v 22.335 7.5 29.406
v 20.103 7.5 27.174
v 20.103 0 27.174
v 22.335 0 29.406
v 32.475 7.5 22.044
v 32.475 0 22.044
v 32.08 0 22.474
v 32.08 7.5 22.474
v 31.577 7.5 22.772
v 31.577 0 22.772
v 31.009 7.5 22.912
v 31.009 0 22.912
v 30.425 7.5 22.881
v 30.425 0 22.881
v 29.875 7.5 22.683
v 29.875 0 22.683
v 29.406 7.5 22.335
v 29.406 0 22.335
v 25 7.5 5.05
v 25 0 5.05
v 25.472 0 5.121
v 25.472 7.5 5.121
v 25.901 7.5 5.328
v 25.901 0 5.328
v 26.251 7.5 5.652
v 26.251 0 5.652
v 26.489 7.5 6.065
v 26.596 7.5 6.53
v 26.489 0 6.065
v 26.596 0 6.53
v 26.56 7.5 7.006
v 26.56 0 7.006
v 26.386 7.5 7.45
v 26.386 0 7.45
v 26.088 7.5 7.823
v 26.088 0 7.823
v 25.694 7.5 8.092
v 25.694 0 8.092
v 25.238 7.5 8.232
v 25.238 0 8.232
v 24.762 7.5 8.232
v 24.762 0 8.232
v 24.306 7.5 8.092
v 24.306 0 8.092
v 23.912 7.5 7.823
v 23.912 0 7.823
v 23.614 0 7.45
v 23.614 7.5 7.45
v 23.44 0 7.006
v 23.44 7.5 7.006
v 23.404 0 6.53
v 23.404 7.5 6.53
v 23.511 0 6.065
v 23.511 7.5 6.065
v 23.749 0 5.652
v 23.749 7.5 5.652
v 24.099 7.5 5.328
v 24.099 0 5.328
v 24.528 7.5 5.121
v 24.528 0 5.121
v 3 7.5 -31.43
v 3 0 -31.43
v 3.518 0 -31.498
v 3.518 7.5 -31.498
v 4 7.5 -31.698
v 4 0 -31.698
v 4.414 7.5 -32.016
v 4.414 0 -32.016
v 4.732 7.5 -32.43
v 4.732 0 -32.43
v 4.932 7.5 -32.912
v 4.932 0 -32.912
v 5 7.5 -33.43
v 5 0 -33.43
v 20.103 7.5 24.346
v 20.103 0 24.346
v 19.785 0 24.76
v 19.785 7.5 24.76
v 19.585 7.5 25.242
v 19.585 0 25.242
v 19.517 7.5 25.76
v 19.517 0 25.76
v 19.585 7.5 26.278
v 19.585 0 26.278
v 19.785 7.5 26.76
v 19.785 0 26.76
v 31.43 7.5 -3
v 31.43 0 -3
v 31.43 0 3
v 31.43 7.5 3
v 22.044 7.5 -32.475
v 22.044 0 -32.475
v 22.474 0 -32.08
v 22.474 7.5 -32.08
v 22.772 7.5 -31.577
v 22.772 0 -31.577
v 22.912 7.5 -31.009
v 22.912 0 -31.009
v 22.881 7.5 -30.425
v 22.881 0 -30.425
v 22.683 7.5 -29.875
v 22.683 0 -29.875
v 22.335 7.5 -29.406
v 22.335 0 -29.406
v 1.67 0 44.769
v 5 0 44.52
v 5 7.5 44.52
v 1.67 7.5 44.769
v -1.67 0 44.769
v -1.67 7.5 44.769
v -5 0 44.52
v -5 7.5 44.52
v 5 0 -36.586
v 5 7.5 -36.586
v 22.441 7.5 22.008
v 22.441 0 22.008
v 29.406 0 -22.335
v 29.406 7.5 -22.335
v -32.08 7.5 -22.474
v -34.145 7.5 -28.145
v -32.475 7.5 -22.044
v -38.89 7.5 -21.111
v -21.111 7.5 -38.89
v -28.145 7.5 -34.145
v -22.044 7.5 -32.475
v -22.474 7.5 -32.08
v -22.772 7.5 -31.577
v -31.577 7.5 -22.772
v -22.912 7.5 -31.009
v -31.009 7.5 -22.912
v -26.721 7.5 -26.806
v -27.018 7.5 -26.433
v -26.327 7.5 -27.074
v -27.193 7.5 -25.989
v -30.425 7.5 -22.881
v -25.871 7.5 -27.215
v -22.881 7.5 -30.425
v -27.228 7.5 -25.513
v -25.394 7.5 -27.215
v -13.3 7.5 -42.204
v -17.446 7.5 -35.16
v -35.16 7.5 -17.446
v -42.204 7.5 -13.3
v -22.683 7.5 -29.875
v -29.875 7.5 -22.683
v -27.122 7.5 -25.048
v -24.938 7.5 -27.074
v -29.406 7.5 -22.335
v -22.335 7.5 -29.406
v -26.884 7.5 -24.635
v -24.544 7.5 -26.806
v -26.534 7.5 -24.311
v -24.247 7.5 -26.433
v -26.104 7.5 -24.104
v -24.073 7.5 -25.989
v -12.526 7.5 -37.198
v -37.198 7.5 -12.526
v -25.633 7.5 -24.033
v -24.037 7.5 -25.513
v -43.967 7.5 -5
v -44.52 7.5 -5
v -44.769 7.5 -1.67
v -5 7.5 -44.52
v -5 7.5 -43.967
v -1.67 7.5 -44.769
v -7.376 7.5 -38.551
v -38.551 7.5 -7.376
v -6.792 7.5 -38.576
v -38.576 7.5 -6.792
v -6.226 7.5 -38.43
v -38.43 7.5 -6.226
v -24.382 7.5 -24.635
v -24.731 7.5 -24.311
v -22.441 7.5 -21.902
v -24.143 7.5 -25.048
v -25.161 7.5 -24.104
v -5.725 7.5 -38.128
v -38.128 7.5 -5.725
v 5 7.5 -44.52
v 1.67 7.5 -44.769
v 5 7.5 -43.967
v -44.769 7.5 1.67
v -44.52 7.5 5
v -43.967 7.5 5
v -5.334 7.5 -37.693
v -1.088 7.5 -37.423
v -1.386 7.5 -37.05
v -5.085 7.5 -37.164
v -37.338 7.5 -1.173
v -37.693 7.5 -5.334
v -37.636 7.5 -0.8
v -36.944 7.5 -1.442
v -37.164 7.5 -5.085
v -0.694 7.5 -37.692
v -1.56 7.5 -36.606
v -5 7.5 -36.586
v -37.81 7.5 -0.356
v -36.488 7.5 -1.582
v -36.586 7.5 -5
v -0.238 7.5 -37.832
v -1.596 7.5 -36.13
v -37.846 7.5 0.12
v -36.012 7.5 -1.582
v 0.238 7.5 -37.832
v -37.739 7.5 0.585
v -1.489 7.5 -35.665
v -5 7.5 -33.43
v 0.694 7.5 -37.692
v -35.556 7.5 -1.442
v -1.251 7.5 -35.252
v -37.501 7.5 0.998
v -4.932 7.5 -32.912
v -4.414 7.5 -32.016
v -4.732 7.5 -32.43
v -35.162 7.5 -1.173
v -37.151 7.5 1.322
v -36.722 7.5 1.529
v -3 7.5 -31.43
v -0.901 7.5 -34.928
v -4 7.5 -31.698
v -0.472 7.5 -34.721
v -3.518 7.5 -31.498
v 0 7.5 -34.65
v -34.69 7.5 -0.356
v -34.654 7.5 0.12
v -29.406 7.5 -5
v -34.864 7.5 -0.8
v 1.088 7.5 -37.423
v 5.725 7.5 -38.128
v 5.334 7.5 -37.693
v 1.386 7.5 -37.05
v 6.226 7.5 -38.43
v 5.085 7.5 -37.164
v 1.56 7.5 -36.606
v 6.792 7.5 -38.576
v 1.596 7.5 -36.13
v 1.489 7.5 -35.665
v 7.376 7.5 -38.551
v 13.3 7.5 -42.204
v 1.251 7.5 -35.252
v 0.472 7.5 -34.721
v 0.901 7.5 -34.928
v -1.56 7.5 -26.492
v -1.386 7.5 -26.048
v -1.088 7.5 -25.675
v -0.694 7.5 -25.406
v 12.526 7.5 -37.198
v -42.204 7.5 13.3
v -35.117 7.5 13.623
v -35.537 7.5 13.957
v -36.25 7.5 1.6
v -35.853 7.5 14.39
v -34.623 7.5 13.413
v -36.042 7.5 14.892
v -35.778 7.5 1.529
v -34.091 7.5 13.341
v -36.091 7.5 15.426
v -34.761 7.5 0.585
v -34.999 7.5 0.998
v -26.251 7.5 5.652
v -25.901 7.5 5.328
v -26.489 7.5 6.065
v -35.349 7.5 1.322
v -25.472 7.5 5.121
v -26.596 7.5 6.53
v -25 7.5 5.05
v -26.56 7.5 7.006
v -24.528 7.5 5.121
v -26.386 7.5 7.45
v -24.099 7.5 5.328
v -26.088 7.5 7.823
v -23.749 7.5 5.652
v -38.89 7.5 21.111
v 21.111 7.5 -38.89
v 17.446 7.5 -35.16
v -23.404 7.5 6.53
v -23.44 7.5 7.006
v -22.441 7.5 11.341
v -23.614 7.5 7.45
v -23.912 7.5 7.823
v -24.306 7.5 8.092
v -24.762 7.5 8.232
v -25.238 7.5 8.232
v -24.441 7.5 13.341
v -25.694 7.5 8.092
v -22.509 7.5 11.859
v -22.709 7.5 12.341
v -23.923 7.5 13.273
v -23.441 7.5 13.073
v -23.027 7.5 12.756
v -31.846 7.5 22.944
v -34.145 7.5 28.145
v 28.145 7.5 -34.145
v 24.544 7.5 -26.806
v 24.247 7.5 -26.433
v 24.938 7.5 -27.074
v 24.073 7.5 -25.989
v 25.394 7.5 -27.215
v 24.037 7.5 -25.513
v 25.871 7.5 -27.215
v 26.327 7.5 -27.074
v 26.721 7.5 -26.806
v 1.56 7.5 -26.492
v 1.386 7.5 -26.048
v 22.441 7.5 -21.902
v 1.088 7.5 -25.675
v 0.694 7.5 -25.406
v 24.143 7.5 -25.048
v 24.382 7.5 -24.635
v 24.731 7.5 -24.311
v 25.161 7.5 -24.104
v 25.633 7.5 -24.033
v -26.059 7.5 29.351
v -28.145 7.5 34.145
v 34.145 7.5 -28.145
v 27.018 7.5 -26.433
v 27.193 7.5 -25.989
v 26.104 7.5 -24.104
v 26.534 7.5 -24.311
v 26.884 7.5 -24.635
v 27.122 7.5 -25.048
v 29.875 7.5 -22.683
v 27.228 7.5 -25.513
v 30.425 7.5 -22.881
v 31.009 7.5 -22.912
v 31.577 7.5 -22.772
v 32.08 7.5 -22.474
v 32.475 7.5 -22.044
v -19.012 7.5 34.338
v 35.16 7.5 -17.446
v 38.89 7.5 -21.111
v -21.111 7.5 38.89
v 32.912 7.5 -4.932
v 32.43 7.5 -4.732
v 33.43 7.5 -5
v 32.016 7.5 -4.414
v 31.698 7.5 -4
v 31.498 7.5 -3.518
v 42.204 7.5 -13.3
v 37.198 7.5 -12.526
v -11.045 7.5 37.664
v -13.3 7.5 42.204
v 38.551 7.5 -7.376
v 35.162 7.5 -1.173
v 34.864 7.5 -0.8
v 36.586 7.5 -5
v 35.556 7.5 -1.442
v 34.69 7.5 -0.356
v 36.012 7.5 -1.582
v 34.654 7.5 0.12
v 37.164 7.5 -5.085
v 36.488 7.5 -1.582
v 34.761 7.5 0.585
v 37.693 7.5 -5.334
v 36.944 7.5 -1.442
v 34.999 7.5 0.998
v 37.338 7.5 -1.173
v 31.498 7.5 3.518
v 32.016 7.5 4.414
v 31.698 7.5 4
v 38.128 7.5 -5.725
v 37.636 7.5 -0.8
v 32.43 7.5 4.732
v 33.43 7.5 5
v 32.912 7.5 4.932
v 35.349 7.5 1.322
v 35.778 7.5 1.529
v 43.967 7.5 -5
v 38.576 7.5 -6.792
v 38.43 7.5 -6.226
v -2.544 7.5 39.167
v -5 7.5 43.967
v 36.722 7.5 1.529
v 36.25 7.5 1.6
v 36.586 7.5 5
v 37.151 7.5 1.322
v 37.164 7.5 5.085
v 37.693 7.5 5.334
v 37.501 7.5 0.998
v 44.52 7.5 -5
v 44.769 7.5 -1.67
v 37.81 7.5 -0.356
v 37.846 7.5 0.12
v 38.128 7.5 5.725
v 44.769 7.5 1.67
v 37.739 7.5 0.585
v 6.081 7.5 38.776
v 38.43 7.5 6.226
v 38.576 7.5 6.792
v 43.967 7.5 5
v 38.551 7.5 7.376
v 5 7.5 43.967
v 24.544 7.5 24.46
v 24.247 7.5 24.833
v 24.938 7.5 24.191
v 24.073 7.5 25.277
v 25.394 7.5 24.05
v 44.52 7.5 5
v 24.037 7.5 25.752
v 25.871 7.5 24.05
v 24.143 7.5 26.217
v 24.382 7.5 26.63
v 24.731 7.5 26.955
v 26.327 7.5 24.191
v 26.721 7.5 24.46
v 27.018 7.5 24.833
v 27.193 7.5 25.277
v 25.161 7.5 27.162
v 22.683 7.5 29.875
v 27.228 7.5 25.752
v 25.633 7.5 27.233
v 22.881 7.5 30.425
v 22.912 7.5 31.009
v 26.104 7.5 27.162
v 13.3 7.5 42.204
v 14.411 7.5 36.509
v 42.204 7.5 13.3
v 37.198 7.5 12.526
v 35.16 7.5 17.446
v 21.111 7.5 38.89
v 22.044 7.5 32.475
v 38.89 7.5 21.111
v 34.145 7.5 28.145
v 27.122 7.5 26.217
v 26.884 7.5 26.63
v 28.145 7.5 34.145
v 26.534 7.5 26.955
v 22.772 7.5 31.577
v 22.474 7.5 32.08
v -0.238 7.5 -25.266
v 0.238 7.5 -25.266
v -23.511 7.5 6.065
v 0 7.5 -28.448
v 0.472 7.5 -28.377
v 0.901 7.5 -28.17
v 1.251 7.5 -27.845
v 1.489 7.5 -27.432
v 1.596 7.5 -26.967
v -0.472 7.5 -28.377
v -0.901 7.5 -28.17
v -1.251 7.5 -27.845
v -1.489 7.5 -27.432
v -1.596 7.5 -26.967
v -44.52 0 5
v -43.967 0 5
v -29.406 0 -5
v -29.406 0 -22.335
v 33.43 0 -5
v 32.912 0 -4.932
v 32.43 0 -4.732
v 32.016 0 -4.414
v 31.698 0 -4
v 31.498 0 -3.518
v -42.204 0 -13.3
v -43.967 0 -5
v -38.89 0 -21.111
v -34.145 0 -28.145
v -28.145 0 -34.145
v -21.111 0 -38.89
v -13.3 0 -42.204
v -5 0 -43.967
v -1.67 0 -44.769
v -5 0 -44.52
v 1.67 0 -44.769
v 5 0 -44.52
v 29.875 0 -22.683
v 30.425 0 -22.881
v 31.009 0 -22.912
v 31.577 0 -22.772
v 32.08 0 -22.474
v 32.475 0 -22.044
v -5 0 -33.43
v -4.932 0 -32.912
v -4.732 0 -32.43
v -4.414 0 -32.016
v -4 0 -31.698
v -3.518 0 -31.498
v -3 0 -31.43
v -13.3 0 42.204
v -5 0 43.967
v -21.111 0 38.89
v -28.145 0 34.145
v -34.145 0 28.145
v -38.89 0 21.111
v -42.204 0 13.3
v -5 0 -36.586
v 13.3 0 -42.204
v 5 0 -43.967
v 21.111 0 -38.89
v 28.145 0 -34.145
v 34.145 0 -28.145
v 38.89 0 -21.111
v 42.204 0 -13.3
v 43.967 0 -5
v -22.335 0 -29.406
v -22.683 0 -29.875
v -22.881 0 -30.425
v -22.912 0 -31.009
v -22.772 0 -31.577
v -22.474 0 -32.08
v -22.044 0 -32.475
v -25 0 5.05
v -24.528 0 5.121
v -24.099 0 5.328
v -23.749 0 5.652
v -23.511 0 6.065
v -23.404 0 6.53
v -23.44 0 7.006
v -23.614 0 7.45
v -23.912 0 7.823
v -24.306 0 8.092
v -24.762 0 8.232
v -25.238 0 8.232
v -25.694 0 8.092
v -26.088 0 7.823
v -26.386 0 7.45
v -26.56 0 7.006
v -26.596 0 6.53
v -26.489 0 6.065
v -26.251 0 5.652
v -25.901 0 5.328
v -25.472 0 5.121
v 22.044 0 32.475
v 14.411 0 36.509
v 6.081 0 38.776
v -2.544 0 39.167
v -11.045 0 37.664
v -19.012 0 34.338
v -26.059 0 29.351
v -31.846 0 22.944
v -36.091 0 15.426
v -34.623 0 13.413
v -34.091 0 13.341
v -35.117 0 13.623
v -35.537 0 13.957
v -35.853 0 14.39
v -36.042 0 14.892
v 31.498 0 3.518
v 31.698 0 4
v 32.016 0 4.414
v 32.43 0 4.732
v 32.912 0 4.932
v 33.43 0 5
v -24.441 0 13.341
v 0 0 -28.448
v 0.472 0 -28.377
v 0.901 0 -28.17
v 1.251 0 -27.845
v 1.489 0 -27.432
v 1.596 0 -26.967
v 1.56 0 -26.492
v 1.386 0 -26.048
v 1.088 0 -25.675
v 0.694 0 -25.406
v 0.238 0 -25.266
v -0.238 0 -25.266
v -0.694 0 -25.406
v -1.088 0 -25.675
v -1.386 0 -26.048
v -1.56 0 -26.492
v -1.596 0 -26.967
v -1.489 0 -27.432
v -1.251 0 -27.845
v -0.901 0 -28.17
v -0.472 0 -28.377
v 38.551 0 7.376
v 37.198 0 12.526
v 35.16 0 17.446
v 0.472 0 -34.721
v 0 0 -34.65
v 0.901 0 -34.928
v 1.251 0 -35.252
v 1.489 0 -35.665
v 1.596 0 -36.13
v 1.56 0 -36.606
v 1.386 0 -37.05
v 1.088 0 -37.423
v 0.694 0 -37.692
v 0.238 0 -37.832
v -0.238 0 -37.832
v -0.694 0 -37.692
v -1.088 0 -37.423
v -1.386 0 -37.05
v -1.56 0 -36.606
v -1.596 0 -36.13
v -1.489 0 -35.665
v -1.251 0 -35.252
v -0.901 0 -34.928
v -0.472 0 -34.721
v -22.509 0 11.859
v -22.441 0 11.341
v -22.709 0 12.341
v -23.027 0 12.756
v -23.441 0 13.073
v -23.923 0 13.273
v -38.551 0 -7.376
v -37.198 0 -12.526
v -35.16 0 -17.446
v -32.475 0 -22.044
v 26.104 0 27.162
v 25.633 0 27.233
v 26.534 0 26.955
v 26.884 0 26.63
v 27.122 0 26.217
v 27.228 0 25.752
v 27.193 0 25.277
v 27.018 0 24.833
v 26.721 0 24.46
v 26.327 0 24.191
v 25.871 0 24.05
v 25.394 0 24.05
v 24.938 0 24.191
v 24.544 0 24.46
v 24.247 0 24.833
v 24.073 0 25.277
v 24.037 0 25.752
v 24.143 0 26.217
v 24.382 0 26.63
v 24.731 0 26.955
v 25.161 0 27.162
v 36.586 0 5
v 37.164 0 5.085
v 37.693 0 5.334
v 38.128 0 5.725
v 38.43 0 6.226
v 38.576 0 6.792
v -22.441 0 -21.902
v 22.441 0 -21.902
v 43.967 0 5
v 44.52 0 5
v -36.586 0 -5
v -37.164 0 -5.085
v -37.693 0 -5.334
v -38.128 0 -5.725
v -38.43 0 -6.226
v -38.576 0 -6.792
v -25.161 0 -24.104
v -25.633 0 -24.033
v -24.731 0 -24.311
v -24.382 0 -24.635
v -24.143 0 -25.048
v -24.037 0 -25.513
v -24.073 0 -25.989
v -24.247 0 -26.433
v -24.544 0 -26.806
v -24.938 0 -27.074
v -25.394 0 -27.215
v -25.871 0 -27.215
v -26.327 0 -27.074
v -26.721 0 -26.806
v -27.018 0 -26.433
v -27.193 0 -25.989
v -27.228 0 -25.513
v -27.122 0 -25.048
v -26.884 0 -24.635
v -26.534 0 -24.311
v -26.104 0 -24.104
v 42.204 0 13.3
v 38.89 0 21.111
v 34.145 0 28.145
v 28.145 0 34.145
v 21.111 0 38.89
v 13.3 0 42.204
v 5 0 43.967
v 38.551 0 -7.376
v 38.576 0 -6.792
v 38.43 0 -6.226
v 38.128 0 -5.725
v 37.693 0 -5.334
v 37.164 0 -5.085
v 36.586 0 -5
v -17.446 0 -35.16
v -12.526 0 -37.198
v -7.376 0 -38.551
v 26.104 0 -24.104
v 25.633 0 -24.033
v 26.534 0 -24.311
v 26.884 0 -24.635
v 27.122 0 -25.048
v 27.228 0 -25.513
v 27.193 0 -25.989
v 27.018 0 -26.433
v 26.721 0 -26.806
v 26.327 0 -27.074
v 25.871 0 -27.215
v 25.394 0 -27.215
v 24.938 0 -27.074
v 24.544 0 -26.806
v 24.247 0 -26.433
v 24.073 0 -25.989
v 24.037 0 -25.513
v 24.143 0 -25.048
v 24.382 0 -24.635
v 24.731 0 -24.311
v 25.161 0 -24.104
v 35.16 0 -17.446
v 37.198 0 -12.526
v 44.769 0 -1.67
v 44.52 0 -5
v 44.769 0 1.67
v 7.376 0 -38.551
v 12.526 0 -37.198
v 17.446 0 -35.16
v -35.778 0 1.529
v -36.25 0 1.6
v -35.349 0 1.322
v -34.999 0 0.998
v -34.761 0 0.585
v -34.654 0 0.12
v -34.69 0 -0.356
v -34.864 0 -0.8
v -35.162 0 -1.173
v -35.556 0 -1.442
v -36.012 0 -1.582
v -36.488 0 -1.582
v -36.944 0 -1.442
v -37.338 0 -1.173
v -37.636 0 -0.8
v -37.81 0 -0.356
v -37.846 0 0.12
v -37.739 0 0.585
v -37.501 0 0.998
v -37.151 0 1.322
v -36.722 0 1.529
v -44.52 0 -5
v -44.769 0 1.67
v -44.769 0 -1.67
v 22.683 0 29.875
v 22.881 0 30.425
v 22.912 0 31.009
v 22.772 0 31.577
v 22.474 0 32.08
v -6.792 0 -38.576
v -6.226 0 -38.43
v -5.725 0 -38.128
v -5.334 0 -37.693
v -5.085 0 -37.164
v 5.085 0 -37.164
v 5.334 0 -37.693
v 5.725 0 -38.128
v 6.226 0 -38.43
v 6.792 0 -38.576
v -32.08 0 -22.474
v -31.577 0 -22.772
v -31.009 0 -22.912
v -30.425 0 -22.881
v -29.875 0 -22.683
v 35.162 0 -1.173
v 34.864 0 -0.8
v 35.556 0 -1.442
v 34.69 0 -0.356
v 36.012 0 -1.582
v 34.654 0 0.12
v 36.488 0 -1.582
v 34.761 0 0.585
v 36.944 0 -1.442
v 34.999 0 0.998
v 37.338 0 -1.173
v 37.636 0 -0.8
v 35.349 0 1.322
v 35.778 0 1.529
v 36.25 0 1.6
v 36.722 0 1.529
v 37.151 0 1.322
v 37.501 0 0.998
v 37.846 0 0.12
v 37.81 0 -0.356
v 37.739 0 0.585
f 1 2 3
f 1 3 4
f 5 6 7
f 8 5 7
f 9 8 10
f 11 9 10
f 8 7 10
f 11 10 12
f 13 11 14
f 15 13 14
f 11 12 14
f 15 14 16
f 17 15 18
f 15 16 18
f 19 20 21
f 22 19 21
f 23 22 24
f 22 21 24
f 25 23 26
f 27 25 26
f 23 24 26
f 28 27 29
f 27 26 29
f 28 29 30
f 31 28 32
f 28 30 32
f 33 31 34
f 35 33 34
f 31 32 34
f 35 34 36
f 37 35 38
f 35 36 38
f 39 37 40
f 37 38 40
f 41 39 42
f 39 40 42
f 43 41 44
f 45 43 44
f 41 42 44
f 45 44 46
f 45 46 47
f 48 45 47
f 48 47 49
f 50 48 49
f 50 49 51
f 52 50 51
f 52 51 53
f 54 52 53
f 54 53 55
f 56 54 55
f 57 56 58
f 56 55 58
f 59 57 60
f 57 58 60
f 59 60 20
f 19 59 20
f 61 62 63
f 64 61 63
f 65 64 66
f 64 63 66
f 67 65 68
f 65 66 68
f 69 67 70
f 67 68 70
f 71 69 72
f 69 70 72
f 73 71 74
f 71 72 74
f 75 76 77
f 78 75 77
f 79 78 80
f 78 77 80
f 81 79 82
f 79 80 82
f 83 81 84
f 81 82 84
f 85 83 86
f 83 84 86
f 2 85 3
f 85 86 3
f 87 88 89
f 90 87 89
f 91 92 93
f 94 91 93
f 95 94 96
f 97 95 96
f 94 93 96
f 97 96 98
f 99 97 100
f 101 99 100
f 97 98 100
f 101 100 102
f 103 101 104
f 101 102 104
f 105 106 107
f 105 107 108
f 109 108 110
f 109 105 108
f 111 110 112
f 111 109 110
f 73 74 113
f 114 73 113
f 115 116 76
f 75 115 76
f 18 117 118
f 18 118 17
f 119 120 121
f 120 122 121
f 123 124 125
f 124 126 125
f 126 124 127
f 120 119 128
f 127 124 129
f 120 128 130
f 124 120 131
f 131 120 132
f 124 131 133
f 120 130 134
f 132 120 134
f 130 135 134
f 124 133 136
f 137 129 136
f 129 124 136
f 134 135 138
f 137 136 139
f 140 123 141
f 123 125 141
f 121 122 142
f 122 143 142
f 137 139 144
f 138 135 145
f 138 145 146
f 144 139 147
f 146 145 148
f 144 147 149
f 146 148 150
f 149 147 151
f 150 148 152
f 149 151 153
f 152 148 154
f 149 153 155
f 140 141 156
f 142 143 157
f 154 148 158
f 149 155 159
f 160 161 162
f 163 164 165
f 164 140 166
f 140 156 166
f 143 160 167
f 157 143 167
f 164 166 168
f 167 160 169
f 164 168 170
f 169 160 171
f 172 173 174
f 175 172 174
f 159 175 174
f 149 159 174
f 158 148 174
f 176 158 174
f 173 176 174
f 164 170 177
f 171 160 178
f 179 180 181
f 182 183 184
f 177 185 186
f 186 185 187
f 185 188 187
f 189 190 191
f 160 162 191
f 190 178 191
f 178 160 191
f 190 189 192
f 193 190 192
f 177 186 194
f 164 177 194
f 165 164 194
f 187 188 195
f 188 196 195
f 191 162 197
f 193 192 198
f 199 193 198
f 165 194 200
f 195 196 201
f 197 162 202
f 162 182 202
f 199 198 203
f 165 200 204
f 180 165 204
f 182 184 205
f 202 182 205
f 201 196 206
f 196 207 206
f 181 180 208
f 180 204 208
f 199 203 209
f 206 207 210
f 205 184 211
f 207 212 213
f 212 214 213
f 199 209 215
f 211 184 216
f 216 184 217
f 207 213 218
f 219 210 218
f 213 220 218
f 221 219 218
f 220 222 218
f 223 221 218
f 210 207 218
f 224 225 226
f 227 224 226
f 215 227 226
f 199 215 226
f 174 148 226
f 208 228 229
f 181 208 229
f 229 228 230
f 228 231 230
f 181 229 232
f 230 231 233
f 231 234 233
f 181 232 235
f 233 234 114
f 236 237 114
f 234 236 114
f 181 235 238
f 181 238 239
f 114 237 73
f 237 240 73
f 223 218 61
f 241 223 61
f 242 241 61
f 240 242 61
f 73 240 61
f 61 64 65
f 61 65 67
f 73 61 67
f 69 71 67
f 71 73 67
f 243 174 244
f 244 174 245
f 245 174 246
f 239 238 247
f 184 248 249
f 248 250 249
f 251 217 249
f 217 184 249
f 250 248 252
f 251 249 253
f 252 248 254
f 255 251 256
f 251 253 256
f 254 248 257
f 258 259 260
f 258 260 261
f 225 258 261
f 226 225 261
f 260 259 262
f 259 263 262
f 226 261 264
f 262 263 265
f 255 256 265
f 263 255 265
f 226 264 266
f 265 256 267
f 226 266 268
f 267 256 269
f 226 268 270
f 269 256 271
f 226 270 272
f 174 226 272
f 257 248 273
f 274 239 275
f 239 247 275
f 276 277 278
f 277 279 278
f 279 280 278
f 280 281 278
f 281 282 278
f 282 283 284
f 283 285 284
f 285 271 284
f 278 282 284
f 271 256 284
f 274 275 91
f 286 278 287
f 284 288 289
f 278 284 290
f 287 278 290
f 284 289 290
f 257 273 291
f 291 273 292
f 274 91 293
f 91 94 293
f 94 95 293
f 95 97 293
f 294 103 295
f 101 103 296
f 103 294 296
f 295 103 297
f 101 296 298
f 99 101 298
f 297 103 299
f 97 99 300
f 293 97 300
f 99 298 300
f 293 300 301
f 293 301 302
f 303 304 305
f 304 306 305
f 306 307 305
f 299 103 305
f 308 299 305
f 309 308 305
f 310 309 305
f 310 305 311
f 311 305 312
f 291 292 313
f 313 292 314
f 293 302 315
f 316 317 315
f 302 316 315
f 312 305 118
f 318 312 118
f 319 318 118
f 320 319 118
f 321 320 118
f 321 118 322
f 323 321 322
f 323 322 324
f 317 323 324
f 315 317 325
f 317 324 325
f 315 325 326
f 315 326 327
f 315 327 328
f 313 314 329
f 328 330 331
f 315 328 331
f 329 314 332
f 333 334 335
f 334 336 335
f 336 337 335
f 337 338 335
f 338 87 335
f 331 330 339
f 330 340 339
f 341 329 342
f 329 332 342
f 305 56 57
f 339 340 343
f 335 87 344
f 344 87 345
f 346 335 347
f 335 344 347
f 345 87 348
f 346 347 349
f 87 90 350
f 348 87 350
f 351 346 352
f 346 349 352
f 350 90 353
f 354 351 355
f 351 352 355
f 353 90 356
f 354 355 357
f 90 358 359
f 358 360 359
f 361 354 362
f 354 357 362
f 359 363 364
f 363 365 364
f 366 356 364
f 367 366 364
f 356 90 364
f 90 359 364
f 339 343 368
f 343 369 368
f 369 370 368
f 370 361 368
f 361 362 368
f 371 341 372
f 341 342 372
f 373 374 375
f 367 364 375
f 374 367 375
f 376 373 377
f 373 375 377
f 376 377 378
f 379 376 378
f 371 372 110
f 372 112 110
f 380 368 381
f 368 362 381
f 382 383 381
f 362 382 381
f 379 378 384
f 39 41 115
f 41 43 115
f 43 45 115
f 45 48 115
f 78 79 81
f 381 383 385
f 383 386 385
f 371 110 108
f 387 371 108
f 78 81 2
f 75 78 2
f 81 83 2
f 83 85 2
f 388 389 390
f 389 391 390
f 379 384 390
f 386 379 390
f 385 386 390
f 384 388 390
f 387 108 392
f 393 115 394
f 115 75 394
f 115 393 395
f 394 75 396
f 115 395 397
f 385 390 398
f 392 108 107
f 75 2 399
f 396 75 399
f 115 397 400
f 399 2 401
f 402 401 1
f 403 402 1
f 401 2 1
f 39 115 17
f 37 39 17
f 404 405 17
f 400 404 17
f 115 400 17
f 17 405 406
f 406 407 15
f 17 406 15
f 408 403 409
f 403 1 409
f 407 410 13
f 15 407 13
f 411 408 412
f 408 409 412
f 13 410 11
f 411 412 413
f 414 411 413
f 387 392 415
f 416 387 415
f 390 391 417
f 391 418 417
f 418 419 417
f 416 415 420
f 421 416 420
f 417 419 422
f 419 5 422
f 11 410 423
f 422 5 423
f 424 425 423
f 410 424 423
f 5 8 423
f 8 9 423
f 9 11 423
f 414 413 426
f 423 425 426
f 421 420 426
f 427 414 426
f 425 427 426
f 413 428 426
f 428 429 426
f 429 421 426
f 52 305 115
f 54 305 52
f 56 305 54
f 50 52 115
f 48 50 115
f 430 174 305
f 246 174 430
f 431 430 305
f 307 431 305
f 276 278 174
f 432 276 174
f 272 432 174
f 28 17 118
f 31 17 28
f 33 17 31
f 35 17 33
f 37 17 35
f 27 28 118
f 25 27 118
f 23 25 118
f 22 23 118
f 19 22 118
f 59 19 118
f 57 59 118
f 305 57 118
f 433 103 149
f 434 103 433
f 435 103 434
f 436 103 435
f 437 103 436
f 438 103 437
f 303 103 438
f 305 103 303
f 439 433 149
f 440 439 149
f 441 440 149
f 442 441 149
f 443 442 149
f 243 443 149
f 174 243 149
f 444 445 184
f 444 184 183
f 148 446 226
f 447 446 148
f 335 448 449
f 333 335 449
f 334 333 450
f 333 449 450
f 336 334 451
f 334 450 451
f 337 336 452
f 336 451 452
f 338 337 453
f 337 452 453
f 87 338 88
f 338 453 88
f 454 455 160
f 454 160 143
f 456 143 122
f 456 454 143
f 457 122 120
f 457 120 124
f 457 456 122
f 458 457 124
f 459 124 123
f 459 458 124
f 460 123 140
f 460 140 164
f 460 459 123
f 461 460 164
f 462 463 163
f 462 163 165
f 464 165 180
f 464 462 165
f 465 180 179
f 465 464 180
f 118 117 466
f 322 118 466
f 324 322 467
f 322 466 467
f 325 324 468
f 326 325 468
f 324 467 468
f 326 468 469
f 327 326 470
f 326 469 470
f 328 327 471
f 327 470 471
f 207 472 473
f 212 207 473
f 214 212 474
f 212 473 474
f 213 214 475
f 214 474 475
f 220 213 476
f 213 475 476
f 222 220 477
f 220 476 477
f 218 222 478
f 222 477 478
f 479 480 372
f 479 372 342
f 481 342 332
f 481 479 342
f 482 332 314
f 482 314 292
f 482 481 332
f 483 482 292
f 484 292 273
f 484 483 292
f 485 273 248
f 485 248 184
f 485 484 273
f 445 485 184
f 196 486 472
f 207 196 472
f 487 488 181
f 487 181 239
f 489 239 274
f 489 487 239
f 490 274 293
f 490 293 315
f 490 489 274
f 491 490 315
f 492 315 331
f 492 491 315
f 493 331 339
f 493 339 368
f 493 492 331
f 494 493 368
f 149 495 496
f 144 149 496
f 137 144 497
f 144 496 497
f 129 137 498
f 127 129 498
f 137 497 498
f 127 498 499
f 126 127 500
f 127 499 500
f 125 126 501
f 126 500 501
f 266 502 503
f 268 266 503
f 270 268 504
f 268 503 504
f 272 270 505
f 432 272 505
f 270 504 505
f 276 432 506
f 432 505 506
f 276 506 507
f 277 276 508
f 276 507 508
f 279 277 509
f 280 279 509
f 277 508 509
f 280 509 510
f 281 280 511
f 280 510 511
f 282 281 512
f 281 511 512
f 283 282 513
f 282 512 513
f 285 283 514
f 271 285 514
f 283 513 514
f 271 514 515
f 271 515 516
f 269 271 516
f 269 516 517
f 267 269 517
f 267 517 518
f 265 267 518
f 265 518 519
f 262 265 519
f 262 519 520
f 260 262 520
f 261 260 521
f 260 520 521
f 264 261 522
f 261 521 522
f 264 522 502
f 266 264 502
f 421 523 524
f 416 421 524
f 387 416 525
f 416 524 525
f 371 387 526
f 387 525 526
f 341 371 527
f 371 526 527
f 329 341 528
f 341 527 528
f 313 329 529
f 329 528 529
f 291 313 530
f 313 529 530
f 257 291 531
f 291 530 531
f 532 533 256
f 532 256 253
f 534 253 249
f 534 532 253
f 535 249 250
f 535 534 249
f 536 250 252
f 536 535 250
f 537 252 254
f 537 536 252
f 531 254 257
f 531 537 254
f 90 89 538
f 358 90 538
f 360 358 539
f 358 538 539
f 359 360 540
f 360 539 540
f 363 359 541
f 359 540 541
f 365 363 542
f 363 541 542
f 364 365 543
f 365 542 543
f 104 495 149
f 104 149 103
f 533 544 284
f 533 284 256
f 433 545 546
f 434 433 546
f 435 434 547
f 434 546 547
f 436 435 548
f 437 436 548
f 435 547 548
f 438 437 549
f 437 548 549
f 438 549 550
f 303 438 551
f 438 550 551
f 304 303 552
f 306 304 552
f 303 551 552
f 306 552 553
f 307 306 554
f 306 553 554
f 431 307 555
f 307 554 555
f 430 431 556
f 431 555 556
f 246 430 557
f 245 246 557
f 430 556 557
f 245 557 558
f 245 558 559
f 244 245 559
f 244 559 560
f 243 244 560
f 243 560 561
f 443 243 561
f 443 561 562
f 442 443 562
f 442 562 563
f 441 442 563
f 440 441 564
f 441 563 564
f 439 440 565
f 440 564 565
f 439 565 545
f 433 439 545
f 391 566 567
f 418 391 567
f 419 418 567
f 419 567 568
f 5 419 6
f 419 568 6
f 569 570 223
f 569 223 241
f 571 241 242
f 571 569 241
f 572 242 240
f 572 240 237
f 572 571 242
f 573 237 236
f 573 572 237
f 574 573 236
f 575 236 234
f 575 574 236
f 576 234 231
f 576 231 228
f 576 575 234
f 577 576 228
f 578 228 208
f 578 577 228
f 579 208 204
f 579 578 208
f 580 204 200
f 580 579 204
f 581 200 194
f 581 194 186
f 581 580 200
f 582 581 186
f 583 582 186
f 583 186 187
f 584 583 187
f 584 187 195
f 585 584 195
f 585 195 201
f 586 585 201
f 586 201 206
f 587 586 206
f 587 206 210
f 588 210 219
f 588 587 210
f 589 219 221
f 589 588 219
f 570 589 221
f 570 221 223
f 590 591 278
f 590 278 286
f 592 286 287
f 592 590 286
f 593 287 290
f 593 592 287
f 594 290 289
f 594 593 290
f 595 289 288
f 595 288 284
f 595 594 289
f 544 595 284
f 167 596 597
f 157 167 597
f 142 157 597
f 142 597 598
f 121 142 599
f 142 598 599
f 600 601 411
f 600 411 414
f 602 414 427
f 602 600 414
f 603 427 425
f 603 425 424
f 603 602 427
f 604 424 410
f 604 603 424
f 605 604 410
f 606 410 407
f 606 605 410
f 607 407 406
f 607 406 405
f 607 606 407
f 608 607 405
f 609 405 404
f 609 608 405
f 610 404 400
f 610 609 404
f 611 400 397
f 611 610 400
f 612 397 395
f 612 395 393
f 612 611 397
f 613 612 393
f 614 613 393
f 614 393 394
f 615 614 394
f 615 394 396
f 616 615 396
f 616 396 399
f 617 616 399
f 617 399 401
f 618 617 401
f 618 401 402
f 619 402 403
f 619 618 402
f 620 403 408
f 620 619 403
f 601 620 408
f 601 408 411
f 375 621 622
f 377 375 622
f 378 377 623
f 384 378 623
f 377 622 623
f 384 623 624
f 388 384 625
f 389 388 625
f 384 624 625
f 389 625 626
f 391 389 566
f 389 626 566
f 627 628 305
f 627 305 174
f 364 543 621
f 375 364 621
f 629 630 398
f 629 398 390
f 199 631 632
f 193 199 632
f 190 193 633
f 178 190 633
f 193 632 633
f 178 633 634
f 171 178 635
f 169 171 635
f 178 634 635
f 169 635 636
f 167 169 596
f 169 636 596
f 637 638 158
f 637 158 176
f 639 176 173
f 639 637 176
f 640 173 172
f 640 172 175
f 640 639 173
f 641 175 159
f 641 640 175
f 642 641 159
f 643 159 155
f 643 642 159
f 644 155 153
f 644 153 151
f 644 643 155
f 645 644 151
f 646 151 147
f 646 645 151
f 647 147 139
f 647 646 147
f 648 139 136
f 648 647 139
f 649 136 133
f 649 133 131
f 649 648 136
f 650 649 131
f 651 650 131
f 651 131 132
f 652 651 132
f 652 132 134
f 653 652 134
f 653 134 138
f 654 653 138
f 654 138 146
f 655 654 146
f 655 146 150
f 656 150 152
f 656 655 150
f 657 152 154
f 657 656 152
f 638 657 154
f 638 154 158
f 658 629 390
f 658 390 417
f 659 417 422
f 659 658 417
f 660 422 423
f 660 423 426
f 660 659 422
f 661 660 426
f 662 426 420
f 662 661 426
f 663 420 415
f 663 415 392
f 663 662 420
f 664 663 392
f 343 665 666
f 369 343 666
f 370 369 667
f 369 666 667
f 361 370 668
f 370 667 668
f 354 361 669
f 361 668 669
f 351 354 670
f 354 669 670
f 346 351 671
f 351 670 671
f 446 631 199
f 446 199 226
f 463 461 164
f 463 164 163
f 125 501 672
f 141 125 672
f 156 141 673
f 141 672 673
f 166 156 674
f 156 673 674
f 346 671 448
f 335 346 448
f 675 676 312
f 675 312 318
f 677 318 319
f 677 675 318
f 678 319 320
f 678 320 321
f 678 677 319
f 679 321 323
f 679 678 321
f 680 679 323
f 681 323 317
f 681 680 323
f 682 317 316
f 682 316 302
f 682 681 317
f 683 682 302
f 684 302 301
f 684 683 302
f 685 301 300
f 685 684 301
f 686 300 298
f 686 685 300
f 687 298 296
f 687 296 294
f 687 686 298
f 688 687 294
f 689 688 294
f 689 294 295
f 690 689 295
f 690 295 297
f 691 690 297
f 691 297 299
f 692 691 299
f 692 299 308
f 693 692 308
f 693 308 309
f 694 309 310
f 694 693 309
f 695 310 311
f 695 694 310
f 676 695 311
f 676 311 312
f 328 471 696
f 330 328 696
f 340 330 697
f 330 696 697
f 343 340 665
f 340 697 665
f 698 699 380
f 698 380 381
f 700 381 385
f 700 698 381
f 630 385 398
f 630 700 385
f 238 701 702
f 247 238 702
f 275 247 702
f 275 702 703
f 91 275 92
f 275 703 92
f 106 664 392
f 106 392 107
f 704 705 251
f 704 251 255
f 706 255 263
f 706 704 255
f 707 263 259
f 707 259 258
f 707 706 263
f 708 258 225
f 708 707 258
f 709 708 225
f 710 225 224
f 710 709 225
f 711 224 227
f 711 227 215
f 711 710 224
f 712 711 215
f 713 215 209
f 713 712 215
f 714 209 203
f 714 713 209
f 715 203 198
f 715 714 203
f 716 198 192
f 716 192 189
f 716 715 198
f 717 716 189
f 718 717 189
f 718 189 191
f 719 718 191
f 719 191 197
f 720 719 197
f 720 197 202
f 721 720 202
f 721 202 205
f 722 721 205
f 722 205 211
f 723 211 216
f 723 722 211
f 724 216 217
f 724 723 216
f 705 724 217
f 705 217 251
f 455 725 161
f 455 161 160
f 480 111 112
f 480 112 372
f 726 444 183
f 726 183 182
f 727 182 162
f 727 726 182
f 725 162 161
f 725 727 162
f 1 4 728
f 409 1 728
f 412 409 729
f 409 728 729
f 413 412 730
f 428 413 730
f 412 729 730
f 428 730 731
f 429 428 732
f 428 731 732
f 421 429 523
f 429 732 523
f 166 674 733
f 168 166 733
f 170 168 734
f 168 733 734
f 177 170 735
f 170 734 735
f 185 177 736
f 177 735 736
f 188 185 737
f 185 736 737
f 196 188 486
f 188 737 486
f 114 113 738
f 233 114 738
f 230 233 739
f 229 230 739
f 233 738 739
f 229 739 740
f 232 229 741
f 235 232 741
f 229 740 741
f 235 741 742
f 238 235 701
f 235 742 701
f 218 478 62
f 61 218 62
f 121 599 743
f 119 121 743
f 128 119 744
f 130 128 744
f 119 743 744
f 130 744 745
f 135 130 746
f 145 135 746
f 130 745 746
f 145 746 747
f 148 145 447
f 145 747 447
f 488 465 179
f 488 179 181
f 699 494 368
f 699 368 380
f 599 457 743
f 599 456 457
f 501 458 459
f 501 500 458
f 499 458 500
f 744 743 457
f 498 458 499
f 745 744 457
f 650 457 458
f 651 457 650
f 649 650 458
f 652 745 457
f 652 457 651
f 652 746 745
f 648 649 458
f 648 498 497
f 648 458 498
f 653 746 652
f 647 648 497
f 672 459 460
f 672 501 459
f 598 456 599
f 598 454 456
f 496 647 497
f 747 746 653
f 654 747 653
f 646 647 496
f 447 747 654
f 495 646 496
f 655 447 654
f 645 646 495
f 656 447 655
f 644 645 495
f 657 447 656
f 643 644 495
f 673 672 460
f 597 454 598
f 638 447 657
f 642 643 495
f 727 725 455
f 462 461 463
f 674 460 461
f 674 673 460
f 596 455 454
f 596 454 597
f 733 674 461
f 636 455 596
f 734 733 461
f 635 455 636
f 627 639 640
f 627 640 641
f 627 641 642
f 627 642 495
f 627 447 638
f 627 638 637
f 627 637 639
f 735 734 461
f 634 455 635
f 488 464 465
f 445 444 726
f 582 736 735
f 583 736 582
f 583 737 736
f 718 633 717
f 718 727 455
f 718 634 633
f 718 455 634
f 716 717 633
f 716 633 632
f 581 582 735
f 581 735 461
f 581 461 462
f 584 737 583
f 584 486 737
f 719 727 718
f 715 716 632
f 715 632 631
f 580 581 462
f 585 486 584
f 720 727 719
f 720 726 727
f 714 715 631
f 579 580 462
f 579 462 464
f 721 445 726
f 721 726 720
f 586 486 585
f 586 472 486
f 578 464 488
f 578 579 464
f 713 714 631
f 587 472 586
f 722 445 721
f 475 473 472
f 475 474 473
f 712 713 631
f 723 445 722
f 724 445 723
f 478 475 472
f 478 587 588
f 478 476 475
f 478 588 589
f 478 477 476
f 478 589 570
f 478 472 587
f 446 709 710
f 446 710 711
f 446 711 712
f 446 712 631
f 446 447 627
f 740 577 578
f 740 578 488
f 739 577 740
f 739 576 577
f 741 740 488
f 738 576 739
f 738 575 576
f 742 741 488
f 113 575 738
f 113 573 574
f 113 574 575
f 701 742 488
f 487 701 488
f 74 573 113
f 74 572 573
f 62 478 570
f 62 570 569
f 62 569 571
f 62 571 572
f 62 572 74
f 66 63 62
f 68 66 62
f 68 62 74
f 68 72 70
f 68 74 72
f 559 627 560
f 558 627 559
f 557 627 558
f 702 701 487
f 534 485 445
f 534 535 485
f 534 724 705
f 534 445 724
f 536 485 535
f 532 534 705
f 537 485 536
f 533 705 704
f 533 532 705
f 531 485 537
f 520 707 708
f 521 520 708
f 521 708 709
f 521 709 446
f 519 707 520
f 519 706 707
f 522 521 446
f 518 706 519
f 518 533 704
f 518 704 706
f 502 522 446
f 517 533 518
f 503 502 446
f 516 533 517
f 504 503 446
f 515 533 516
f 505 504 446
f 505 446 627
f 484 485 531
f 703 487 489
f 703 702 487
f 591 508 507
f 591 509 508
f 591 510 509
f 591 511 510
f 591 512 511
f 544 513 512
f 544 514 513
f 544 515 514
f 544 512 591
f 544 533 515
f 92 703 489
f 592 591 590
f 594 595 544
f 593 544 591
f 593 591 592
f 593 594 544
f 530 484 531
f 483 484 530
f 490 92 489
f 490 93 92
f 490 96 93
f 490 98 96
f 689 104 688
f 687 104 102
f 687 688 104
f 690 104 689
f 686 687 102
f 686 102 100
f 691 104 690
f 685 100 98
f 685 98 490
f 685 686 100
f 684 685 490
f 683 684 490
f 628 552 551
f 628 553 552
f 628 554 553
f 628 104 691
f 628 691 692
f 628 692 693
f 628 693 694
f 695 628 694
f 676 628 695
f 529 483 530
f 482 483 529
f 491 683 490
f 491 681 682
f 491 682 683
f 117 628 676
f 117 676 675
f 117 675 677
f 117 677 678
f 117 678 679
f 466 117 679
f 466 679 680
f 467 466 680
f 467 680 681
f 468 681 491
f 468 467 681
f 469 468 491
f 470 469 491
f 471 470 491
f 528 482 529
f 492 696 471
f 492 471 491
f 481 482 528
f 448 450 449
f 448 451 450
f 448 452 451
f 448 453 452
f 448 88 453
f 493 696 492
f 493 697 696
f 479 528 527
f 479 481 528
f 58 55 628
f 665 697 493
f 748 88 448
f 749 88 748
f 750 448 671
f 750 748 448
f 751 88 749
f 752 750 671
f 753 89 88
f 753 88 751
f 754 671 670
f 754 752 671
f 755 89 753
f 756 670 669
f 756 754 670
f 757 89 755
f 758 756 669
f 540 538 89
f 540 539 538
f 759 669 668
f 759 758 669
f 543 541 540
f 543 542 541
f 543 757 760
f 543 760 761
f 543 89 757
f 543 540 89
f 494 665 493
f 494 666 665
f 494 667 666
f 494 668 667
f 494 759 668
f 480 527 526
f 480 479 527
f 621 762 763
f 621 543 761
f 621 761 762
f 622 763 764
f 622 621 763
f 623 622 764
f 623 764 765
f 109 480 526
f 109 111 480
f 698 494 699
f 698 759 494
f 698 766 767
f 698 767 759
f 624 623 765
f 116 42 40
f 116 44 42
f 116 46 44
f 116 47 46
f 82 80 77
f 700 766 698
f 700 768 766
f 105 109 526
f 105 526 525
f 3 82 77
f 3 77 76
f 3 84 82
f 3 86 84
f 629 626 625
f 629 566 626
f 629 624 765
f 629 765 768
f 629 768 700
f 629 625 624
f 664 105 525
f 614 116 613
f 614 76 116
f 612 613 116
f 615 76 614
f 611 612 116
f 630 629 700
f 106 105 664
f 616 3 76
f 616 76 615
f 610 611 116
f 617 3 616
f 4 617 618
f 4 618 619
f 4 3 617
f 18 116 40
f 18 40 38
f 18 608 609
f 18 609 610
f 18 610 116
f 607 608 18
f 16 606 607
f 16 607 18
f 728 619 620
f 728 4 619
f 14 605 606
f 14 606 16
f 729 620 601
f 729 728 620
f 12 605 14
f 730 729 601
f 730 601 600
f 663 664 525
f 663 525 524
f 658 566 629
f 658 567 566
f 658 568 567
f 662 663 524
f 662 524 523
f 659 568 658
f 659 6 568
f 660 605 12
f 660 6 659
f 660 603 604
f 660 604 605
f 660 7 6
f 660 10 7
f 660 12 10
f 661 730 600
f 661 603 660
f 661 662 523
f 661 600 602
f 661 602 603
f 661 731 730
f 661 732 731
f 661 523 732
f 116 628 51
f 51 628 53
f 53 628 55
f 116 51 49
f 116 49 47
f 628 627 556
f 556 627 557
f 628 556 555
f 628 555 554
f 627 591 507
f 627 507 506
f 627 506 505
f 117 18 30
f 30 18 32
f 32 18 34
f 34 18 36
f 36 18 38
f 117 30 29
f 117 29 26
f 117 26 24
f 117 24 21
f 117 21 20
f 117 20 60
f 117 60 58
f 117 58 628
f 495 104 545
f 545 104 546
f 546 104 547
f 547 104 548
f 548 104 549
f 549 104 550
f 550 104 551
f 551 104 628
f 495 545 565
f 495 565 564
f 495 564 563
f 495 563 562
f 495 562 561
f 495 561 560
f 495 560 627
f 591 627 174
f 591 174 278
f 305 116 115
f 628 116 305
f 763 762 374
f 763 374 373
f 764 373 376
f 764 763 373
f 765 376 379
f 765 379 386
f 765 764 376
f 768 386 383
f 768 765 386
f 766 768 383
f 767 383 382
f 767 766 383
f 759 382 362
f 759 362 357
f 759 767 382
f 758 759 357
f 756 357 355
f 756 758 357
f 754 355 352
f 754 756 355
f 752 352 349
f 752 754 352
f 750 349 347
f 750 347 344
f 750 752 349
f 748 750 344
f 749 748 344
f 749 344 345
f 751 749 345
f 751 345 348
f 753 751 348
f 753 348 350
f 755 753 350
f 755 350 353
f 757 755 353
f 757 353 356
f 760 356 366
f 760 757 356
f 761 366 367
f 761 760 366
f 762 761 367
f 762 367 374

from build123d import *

# Parameters (mm, degrees)
SKETCH2_R           = 1.6
BOSS_EXTRUDE2_DEPTH = 7.5
SKETCH3_R           = 1.6
BOSS_EXTRUDE3_DEPTH = 7.5


with BuildPart() as part:
    # Sketch2 → Boss-Extrude2 (new body)
    with BuildSketch(Plane(origin=(0, 0, 0), x_dir=(1, 0, 0), z_dir=(0, 1, 0))):
        with BuildLine():
            Line((43.966606646, 5), (44.520107816, 5))
            ThreePointArc((44.520107816, 5), (44.8, 0), (44.520107816, -5))
            Line((44.520107816, -5), (43.966606646, -5))
            ThreePointArc((43.966606646, -5), (31.289475067, -31.289475068), (5, -43.966606646))
            Line((5, -43.966606646), (5, -44.520107816))
            ThreePointArc((5, -44.520107816), (0, -44.8), (-5, -44.520107816))
            Line((-5, -44.520107816), (-5, -43.966606646))
            ThreePointArc((-5, -43.966606646), (-31.289475068, -31.289475067), (-43.966606646, -5))
            Line((-43.966606646, -5), (-44.520107816, -5))
            ThreePointArc((-44.520107816, -5), (-44.8, 0), (-44.520107816, 5))
            Line((-44.520107816, 5), (-43.966606646, 5))
            ThreePointArc((-43.966606646, 5), (-31.289475067, 31.289475068), (-5, 43.966606646))
            Line((-5, 43.966606646), (-5, 44.520107816))
            ThreePointArc((-5, 44.520107816), (0, 44.8), (5, 44.520107816))
            Line((5, 44.520107816), (5, 43.966606646))
            ThreePointArc((5, 43.966606646), (31.289475068, 31.289475067), (43.966606646, 5))
        make_face()
        with Locations(Location((36.25, 0, 0), (0, 0, 270))):
            Circle(SKETCH2_R, mode=Mode.SUBTRACT)
        with Locations(Location((25.632620818, -25.632620818, 0), (0, 0, 270))):
            Circle(SKETCH2_R, mode=Mode.SUBTRACT)
        with Locations(Location((-36.25, 0, 0), (0, 0, 270))):
            Circle(SKETCH2_R, mode=Mode.SUBTRACT)
        with Locations(Location((-25.632620818, 25.632620818, 0), (0, 0, 270))):
            Circle(SKETCH2_R, mode=Mode.SUBTRACT)
        with Locations(Location((0, 36.25, 0), (0, 0, 270))):
            Circle(SKETCH2_R, mode=Mode.SUBTRACT)
        with Locations(Location((25.632620818, 25.632620818, 0), (0, 0, 270))):
            Circle(SKETCH2_R, mode=Mode.SUBTRACT)
        with BuildLine():
            Line((31.43, 3), (31.43, -3))
            ThreePointArc((31.43, -3), (32.015786437, -4.414213563), (33.43, -5))
            Line((33.43, -5), (36.58614437, -5))
            ThreePointArc((36.58614437, -5), (38.127674053, -5.725487102), (38.550739297, -7.375838913))
            ThreePointArc((38.550739297, -7.375838913), (36.262271651, -15.02032472), (32.474994889, -22.043983464))
            ThreePointArc((32.474994889, -22.043983464), (31.00886763, -22.911806118), (29.405844687, -22.334776876))
            Line((29.405844687, -22.334776876), (27.174113601, -20.103045789))
            ThreePointArc((27.174113601, -20.103045789), (25.759900039, -19.517259351), (24.345686476, -20.103045789))
            Line((24.345686476, -20.103045789), (20.103045789, -24.345686476))
            ThreePointArc((20.103045789, -24.345686476), (19.517259351, -25.759900039), (20.103045789, -27.174113601))
            Line((20.103045789, -27.174113601), (22.334776875, -29.405844688))
            ThreePointArc((22.334776875, -29.405844688), (22.911806119, -31.00886763), (22.043983464, -32.474994889))
            ThreePointArc((22.043983464, -32.474994889), (-15.02032472, -36.262271651), (-38.550739297, -7.375838914))
            ThreePointArc((-38.550739297, -7.375838914), (-38.127674054, -5.725487102), (-36.58614437, -5))
            Line((-36.58614437, -5), (-33.43, -5))
            ThreePointArc((-33.43, -5), (-32.015786438, -4.414213562), (-31.43, -3))
            Line((-31.43, -3), (-31.43, 3))
            ThreePointArc((-31.43, 3), (-32.015786437, 4.414213563), (-33.43, 5))
            Line((-33.43, 5), (-36.58614437, 5))
            ThreePointArc((-36.58614437, 5), (-38.127674053, 5.725487102), (-38.550739297, 7.375838913))
            ThreePointArc((-38.550739297, 7.375838913), (-36.262271651, 15.02032472), (-32.474994889, 22.043983464))
            ThreePointArc((-32.474994889, 22.043983464), (-31.00886763, 22.911806118), (-29.405844687, 22.334776876))
            Line((-29.405844687, 22.334776876), (-27.174113601, 20.103045789))
            ThreePointArc((-27.174113601, 20.103045789), (-25.759900039, 19.517259351), (-24.345686476, 20.103045789))
            Line((-24.345686476, 20.103045789), (-20.103045789, 24.345686476))
            ThreePointArc((-20.103045789, 24.345686476), (-19.517259351, 25.759900039), (-20.103045789, 27.174113601))
            Line((-20.103045789, 27.174113601), (-22.334776875, 29.405844688))
            ThreePointArc((-22.334776875, 29.405844688), (-22.911806119, 31.00886763), (-22.043983464, 32.474994889))
            ThreePointArc((-22.043983464, 32.474994889), (-15.020324721, 36.262271651), (-7.375838914, 38.550739297))
            ThreePointArc((-7.375838914, 38.550739297), (-5.725487102, 38.127674054), (-5, 36.58614437))
            Line((-5, 36.58614437), (-5, 33.43))
            ThreePointArc((-5, 33.43), (-4.414213562, 32.015786438), (-3, 31.43))
            Line((-3, 31.43), (3, 31.43))
            ThreePointArc((3, 31.43), (4.414213563, 32.015786437), (5, 33.43))
            Line((5, 33.43), (5, 36.58614437))
            ThreePointArc((5, 36.58614437), (5.725487102, 38.127674053), (7.375838913, 38.550739297))
            ThreePointArc((7.375838913, 38.550739297), (15.02032472, 36.262271651), (22.043983464, 32.474994889))
            ThreePointArc((22.043983464, 32.474994889), (22.911806118, 31.00886763), (22.334776876, 29.405844687))
            Line((22.334776876, 29.405844687), (20.103045789, 27.174113601))
            ThreePointArc((20.103045789, 27.174113601), (19.517259351, 25.759900039), (20.103045789, 24.345686476))
            Line((20.103045789, 24.345686476), (24.345686476, 20.103045789))
            ThreePointArc((24.345686476, 20.103045789), (25.759900039, 19.517259351), (27.174113601, 20.103045789))
            Line((27.174113601, 20.103045789), (29.405844688, 22.334776875))
            ThreePointArc((29.405844688, 22.334776875), (31.00886763, 22.911806119), (32.474994889, 22.043983464))
            ThreePointArc((32.474994889, 22.043983464), (36.262271651, 15.020324721), (38.550739297, 7.375838914))
            ThreePointArc((38.550739297, 7.375838914), (38.127674054, 5.725487102), (36.58614437, 5))
            Line((36.58614437, 5), (33.43, 5))
            ThreePointArc((33.43, 5), (32.015786438, 4.414213562), (31.43, 3))
        make_face(mode=Mode.SUBTRACT)
    extrude(amount=BOSS_EXTRUDE2_DEPTH)

    # Sketch3 → Boss-Extrude3 (add)
    with BuildSketch(Plane.XZ):
        with BuildLine():
            Line((22.440941356, -21.901962064), (-22.440941356, -21.901962064))
            Line((-22.440941356, -21.901962064), (-22.440941356, 6.65))
            Line((-22.440941356, 6.65), (-22.440941356, 11.341310409))
            ThreePointArc((-22.440941356, 11.341310409), (-23.026727793, 12.755523971), (-24.440941356, 13.341310409))
            Line((-24.440941356, 13.341310409), (-29.405844687, 13.341310409))
            Line((-29.405844687, 13.341310409), (-34.091425962, 13.341310409))
            ThreePointArc((-34.091425962, 13.341310409), (-35.536566009, 13.956827134), (-36.091425962, 15.426323995))
            Line((-36.091425962, 15.426323995), (-39.579540156, 15.426323995))
            Line((-39.579540156, 15.426323995), (-39.579540156, 13.341310409))
            Line((-39.579540156, 13.341310409), (-39.579540156, 3.405536176))
            Line((-39.579540156, 3.405536176), (-33.43, 3.405536176))
            Line((-33.43, 3.405536176), (-33.43, -5))
            Line((-33.43, -5), (-29.405844687, -5))
            Line((-29.405844687, -5), (-29.405844687, -22.334776876))
            Line((-29.405844687, -22.334776876), (-29.405844687, -29.405844688))
            Line((-29.405844687, -29.405844688), (-22.334776875, -29.405844688))
            Line((-22.334776875, -29.405844688), (22.334776876, -29.405844687))
            Line((22.334776876, -29.405844687), (29.405844688, -29.405844688))
            Line((29.405844688, -29.405844688), (29.405844688, -22.334776875))
            Line((29.405844688, -22.334776875), (29.405844687, 22.334776876))
            Line((29.405844687, 22.334776876), (29.405844688, 29.405844687))
            Line((29.405844688, 29.405844687), (23.434556913, 29.405844687))
            Line((23.434556913, 29.405844687), (23.434556913, 25.632620817))
            Line((23.434556913, 25.632620817), (22.440941356, 25.632620817))
            Line((22.440941356, 25.632620817), (22.440941356, 24.032620818))
            Line((22.440941356, 24.032620818), (22.440941356, -21.901962064))
        make_face()
        with Locations(Location((0, -26.847695671, 0), (0, 0, 270))):
            Circle(SKETCH3_R, mode=Mode.SUBTRACT)
        with Locations(Location((-25, 6.65, 0), (0, 0, 270))):
            Circle(SKETCH3_R, mode=Mode.SUBTRACT)
        with Locations(Location((25, 6.65, 0), (0, 0, 270))):
            Circle(SKETCH3_R, mode=Mode.SUBTRACT)
        with Locations(Location((25.632620818, 25.632620818, 0), (0, 0, 90))):
            Circle(SKETCH3_R, mode=Mode.SUBTRACT)
        with Locations(Location((-25.632620818, -25.632620818, 0), (0, 0, 90))):
            Circle(SKETCH3_R, mode=Mode.SUBTRACT)
        with Locations(Location((25.632620818, -25.632620818, 0), (0, 0, 90))):
            Circle(SKETCH3_R, mode=Mode.SUBTRACT)
    extrude(amount=-BOSS_EXTRUDE3_DEPTH)


solid = part.part
